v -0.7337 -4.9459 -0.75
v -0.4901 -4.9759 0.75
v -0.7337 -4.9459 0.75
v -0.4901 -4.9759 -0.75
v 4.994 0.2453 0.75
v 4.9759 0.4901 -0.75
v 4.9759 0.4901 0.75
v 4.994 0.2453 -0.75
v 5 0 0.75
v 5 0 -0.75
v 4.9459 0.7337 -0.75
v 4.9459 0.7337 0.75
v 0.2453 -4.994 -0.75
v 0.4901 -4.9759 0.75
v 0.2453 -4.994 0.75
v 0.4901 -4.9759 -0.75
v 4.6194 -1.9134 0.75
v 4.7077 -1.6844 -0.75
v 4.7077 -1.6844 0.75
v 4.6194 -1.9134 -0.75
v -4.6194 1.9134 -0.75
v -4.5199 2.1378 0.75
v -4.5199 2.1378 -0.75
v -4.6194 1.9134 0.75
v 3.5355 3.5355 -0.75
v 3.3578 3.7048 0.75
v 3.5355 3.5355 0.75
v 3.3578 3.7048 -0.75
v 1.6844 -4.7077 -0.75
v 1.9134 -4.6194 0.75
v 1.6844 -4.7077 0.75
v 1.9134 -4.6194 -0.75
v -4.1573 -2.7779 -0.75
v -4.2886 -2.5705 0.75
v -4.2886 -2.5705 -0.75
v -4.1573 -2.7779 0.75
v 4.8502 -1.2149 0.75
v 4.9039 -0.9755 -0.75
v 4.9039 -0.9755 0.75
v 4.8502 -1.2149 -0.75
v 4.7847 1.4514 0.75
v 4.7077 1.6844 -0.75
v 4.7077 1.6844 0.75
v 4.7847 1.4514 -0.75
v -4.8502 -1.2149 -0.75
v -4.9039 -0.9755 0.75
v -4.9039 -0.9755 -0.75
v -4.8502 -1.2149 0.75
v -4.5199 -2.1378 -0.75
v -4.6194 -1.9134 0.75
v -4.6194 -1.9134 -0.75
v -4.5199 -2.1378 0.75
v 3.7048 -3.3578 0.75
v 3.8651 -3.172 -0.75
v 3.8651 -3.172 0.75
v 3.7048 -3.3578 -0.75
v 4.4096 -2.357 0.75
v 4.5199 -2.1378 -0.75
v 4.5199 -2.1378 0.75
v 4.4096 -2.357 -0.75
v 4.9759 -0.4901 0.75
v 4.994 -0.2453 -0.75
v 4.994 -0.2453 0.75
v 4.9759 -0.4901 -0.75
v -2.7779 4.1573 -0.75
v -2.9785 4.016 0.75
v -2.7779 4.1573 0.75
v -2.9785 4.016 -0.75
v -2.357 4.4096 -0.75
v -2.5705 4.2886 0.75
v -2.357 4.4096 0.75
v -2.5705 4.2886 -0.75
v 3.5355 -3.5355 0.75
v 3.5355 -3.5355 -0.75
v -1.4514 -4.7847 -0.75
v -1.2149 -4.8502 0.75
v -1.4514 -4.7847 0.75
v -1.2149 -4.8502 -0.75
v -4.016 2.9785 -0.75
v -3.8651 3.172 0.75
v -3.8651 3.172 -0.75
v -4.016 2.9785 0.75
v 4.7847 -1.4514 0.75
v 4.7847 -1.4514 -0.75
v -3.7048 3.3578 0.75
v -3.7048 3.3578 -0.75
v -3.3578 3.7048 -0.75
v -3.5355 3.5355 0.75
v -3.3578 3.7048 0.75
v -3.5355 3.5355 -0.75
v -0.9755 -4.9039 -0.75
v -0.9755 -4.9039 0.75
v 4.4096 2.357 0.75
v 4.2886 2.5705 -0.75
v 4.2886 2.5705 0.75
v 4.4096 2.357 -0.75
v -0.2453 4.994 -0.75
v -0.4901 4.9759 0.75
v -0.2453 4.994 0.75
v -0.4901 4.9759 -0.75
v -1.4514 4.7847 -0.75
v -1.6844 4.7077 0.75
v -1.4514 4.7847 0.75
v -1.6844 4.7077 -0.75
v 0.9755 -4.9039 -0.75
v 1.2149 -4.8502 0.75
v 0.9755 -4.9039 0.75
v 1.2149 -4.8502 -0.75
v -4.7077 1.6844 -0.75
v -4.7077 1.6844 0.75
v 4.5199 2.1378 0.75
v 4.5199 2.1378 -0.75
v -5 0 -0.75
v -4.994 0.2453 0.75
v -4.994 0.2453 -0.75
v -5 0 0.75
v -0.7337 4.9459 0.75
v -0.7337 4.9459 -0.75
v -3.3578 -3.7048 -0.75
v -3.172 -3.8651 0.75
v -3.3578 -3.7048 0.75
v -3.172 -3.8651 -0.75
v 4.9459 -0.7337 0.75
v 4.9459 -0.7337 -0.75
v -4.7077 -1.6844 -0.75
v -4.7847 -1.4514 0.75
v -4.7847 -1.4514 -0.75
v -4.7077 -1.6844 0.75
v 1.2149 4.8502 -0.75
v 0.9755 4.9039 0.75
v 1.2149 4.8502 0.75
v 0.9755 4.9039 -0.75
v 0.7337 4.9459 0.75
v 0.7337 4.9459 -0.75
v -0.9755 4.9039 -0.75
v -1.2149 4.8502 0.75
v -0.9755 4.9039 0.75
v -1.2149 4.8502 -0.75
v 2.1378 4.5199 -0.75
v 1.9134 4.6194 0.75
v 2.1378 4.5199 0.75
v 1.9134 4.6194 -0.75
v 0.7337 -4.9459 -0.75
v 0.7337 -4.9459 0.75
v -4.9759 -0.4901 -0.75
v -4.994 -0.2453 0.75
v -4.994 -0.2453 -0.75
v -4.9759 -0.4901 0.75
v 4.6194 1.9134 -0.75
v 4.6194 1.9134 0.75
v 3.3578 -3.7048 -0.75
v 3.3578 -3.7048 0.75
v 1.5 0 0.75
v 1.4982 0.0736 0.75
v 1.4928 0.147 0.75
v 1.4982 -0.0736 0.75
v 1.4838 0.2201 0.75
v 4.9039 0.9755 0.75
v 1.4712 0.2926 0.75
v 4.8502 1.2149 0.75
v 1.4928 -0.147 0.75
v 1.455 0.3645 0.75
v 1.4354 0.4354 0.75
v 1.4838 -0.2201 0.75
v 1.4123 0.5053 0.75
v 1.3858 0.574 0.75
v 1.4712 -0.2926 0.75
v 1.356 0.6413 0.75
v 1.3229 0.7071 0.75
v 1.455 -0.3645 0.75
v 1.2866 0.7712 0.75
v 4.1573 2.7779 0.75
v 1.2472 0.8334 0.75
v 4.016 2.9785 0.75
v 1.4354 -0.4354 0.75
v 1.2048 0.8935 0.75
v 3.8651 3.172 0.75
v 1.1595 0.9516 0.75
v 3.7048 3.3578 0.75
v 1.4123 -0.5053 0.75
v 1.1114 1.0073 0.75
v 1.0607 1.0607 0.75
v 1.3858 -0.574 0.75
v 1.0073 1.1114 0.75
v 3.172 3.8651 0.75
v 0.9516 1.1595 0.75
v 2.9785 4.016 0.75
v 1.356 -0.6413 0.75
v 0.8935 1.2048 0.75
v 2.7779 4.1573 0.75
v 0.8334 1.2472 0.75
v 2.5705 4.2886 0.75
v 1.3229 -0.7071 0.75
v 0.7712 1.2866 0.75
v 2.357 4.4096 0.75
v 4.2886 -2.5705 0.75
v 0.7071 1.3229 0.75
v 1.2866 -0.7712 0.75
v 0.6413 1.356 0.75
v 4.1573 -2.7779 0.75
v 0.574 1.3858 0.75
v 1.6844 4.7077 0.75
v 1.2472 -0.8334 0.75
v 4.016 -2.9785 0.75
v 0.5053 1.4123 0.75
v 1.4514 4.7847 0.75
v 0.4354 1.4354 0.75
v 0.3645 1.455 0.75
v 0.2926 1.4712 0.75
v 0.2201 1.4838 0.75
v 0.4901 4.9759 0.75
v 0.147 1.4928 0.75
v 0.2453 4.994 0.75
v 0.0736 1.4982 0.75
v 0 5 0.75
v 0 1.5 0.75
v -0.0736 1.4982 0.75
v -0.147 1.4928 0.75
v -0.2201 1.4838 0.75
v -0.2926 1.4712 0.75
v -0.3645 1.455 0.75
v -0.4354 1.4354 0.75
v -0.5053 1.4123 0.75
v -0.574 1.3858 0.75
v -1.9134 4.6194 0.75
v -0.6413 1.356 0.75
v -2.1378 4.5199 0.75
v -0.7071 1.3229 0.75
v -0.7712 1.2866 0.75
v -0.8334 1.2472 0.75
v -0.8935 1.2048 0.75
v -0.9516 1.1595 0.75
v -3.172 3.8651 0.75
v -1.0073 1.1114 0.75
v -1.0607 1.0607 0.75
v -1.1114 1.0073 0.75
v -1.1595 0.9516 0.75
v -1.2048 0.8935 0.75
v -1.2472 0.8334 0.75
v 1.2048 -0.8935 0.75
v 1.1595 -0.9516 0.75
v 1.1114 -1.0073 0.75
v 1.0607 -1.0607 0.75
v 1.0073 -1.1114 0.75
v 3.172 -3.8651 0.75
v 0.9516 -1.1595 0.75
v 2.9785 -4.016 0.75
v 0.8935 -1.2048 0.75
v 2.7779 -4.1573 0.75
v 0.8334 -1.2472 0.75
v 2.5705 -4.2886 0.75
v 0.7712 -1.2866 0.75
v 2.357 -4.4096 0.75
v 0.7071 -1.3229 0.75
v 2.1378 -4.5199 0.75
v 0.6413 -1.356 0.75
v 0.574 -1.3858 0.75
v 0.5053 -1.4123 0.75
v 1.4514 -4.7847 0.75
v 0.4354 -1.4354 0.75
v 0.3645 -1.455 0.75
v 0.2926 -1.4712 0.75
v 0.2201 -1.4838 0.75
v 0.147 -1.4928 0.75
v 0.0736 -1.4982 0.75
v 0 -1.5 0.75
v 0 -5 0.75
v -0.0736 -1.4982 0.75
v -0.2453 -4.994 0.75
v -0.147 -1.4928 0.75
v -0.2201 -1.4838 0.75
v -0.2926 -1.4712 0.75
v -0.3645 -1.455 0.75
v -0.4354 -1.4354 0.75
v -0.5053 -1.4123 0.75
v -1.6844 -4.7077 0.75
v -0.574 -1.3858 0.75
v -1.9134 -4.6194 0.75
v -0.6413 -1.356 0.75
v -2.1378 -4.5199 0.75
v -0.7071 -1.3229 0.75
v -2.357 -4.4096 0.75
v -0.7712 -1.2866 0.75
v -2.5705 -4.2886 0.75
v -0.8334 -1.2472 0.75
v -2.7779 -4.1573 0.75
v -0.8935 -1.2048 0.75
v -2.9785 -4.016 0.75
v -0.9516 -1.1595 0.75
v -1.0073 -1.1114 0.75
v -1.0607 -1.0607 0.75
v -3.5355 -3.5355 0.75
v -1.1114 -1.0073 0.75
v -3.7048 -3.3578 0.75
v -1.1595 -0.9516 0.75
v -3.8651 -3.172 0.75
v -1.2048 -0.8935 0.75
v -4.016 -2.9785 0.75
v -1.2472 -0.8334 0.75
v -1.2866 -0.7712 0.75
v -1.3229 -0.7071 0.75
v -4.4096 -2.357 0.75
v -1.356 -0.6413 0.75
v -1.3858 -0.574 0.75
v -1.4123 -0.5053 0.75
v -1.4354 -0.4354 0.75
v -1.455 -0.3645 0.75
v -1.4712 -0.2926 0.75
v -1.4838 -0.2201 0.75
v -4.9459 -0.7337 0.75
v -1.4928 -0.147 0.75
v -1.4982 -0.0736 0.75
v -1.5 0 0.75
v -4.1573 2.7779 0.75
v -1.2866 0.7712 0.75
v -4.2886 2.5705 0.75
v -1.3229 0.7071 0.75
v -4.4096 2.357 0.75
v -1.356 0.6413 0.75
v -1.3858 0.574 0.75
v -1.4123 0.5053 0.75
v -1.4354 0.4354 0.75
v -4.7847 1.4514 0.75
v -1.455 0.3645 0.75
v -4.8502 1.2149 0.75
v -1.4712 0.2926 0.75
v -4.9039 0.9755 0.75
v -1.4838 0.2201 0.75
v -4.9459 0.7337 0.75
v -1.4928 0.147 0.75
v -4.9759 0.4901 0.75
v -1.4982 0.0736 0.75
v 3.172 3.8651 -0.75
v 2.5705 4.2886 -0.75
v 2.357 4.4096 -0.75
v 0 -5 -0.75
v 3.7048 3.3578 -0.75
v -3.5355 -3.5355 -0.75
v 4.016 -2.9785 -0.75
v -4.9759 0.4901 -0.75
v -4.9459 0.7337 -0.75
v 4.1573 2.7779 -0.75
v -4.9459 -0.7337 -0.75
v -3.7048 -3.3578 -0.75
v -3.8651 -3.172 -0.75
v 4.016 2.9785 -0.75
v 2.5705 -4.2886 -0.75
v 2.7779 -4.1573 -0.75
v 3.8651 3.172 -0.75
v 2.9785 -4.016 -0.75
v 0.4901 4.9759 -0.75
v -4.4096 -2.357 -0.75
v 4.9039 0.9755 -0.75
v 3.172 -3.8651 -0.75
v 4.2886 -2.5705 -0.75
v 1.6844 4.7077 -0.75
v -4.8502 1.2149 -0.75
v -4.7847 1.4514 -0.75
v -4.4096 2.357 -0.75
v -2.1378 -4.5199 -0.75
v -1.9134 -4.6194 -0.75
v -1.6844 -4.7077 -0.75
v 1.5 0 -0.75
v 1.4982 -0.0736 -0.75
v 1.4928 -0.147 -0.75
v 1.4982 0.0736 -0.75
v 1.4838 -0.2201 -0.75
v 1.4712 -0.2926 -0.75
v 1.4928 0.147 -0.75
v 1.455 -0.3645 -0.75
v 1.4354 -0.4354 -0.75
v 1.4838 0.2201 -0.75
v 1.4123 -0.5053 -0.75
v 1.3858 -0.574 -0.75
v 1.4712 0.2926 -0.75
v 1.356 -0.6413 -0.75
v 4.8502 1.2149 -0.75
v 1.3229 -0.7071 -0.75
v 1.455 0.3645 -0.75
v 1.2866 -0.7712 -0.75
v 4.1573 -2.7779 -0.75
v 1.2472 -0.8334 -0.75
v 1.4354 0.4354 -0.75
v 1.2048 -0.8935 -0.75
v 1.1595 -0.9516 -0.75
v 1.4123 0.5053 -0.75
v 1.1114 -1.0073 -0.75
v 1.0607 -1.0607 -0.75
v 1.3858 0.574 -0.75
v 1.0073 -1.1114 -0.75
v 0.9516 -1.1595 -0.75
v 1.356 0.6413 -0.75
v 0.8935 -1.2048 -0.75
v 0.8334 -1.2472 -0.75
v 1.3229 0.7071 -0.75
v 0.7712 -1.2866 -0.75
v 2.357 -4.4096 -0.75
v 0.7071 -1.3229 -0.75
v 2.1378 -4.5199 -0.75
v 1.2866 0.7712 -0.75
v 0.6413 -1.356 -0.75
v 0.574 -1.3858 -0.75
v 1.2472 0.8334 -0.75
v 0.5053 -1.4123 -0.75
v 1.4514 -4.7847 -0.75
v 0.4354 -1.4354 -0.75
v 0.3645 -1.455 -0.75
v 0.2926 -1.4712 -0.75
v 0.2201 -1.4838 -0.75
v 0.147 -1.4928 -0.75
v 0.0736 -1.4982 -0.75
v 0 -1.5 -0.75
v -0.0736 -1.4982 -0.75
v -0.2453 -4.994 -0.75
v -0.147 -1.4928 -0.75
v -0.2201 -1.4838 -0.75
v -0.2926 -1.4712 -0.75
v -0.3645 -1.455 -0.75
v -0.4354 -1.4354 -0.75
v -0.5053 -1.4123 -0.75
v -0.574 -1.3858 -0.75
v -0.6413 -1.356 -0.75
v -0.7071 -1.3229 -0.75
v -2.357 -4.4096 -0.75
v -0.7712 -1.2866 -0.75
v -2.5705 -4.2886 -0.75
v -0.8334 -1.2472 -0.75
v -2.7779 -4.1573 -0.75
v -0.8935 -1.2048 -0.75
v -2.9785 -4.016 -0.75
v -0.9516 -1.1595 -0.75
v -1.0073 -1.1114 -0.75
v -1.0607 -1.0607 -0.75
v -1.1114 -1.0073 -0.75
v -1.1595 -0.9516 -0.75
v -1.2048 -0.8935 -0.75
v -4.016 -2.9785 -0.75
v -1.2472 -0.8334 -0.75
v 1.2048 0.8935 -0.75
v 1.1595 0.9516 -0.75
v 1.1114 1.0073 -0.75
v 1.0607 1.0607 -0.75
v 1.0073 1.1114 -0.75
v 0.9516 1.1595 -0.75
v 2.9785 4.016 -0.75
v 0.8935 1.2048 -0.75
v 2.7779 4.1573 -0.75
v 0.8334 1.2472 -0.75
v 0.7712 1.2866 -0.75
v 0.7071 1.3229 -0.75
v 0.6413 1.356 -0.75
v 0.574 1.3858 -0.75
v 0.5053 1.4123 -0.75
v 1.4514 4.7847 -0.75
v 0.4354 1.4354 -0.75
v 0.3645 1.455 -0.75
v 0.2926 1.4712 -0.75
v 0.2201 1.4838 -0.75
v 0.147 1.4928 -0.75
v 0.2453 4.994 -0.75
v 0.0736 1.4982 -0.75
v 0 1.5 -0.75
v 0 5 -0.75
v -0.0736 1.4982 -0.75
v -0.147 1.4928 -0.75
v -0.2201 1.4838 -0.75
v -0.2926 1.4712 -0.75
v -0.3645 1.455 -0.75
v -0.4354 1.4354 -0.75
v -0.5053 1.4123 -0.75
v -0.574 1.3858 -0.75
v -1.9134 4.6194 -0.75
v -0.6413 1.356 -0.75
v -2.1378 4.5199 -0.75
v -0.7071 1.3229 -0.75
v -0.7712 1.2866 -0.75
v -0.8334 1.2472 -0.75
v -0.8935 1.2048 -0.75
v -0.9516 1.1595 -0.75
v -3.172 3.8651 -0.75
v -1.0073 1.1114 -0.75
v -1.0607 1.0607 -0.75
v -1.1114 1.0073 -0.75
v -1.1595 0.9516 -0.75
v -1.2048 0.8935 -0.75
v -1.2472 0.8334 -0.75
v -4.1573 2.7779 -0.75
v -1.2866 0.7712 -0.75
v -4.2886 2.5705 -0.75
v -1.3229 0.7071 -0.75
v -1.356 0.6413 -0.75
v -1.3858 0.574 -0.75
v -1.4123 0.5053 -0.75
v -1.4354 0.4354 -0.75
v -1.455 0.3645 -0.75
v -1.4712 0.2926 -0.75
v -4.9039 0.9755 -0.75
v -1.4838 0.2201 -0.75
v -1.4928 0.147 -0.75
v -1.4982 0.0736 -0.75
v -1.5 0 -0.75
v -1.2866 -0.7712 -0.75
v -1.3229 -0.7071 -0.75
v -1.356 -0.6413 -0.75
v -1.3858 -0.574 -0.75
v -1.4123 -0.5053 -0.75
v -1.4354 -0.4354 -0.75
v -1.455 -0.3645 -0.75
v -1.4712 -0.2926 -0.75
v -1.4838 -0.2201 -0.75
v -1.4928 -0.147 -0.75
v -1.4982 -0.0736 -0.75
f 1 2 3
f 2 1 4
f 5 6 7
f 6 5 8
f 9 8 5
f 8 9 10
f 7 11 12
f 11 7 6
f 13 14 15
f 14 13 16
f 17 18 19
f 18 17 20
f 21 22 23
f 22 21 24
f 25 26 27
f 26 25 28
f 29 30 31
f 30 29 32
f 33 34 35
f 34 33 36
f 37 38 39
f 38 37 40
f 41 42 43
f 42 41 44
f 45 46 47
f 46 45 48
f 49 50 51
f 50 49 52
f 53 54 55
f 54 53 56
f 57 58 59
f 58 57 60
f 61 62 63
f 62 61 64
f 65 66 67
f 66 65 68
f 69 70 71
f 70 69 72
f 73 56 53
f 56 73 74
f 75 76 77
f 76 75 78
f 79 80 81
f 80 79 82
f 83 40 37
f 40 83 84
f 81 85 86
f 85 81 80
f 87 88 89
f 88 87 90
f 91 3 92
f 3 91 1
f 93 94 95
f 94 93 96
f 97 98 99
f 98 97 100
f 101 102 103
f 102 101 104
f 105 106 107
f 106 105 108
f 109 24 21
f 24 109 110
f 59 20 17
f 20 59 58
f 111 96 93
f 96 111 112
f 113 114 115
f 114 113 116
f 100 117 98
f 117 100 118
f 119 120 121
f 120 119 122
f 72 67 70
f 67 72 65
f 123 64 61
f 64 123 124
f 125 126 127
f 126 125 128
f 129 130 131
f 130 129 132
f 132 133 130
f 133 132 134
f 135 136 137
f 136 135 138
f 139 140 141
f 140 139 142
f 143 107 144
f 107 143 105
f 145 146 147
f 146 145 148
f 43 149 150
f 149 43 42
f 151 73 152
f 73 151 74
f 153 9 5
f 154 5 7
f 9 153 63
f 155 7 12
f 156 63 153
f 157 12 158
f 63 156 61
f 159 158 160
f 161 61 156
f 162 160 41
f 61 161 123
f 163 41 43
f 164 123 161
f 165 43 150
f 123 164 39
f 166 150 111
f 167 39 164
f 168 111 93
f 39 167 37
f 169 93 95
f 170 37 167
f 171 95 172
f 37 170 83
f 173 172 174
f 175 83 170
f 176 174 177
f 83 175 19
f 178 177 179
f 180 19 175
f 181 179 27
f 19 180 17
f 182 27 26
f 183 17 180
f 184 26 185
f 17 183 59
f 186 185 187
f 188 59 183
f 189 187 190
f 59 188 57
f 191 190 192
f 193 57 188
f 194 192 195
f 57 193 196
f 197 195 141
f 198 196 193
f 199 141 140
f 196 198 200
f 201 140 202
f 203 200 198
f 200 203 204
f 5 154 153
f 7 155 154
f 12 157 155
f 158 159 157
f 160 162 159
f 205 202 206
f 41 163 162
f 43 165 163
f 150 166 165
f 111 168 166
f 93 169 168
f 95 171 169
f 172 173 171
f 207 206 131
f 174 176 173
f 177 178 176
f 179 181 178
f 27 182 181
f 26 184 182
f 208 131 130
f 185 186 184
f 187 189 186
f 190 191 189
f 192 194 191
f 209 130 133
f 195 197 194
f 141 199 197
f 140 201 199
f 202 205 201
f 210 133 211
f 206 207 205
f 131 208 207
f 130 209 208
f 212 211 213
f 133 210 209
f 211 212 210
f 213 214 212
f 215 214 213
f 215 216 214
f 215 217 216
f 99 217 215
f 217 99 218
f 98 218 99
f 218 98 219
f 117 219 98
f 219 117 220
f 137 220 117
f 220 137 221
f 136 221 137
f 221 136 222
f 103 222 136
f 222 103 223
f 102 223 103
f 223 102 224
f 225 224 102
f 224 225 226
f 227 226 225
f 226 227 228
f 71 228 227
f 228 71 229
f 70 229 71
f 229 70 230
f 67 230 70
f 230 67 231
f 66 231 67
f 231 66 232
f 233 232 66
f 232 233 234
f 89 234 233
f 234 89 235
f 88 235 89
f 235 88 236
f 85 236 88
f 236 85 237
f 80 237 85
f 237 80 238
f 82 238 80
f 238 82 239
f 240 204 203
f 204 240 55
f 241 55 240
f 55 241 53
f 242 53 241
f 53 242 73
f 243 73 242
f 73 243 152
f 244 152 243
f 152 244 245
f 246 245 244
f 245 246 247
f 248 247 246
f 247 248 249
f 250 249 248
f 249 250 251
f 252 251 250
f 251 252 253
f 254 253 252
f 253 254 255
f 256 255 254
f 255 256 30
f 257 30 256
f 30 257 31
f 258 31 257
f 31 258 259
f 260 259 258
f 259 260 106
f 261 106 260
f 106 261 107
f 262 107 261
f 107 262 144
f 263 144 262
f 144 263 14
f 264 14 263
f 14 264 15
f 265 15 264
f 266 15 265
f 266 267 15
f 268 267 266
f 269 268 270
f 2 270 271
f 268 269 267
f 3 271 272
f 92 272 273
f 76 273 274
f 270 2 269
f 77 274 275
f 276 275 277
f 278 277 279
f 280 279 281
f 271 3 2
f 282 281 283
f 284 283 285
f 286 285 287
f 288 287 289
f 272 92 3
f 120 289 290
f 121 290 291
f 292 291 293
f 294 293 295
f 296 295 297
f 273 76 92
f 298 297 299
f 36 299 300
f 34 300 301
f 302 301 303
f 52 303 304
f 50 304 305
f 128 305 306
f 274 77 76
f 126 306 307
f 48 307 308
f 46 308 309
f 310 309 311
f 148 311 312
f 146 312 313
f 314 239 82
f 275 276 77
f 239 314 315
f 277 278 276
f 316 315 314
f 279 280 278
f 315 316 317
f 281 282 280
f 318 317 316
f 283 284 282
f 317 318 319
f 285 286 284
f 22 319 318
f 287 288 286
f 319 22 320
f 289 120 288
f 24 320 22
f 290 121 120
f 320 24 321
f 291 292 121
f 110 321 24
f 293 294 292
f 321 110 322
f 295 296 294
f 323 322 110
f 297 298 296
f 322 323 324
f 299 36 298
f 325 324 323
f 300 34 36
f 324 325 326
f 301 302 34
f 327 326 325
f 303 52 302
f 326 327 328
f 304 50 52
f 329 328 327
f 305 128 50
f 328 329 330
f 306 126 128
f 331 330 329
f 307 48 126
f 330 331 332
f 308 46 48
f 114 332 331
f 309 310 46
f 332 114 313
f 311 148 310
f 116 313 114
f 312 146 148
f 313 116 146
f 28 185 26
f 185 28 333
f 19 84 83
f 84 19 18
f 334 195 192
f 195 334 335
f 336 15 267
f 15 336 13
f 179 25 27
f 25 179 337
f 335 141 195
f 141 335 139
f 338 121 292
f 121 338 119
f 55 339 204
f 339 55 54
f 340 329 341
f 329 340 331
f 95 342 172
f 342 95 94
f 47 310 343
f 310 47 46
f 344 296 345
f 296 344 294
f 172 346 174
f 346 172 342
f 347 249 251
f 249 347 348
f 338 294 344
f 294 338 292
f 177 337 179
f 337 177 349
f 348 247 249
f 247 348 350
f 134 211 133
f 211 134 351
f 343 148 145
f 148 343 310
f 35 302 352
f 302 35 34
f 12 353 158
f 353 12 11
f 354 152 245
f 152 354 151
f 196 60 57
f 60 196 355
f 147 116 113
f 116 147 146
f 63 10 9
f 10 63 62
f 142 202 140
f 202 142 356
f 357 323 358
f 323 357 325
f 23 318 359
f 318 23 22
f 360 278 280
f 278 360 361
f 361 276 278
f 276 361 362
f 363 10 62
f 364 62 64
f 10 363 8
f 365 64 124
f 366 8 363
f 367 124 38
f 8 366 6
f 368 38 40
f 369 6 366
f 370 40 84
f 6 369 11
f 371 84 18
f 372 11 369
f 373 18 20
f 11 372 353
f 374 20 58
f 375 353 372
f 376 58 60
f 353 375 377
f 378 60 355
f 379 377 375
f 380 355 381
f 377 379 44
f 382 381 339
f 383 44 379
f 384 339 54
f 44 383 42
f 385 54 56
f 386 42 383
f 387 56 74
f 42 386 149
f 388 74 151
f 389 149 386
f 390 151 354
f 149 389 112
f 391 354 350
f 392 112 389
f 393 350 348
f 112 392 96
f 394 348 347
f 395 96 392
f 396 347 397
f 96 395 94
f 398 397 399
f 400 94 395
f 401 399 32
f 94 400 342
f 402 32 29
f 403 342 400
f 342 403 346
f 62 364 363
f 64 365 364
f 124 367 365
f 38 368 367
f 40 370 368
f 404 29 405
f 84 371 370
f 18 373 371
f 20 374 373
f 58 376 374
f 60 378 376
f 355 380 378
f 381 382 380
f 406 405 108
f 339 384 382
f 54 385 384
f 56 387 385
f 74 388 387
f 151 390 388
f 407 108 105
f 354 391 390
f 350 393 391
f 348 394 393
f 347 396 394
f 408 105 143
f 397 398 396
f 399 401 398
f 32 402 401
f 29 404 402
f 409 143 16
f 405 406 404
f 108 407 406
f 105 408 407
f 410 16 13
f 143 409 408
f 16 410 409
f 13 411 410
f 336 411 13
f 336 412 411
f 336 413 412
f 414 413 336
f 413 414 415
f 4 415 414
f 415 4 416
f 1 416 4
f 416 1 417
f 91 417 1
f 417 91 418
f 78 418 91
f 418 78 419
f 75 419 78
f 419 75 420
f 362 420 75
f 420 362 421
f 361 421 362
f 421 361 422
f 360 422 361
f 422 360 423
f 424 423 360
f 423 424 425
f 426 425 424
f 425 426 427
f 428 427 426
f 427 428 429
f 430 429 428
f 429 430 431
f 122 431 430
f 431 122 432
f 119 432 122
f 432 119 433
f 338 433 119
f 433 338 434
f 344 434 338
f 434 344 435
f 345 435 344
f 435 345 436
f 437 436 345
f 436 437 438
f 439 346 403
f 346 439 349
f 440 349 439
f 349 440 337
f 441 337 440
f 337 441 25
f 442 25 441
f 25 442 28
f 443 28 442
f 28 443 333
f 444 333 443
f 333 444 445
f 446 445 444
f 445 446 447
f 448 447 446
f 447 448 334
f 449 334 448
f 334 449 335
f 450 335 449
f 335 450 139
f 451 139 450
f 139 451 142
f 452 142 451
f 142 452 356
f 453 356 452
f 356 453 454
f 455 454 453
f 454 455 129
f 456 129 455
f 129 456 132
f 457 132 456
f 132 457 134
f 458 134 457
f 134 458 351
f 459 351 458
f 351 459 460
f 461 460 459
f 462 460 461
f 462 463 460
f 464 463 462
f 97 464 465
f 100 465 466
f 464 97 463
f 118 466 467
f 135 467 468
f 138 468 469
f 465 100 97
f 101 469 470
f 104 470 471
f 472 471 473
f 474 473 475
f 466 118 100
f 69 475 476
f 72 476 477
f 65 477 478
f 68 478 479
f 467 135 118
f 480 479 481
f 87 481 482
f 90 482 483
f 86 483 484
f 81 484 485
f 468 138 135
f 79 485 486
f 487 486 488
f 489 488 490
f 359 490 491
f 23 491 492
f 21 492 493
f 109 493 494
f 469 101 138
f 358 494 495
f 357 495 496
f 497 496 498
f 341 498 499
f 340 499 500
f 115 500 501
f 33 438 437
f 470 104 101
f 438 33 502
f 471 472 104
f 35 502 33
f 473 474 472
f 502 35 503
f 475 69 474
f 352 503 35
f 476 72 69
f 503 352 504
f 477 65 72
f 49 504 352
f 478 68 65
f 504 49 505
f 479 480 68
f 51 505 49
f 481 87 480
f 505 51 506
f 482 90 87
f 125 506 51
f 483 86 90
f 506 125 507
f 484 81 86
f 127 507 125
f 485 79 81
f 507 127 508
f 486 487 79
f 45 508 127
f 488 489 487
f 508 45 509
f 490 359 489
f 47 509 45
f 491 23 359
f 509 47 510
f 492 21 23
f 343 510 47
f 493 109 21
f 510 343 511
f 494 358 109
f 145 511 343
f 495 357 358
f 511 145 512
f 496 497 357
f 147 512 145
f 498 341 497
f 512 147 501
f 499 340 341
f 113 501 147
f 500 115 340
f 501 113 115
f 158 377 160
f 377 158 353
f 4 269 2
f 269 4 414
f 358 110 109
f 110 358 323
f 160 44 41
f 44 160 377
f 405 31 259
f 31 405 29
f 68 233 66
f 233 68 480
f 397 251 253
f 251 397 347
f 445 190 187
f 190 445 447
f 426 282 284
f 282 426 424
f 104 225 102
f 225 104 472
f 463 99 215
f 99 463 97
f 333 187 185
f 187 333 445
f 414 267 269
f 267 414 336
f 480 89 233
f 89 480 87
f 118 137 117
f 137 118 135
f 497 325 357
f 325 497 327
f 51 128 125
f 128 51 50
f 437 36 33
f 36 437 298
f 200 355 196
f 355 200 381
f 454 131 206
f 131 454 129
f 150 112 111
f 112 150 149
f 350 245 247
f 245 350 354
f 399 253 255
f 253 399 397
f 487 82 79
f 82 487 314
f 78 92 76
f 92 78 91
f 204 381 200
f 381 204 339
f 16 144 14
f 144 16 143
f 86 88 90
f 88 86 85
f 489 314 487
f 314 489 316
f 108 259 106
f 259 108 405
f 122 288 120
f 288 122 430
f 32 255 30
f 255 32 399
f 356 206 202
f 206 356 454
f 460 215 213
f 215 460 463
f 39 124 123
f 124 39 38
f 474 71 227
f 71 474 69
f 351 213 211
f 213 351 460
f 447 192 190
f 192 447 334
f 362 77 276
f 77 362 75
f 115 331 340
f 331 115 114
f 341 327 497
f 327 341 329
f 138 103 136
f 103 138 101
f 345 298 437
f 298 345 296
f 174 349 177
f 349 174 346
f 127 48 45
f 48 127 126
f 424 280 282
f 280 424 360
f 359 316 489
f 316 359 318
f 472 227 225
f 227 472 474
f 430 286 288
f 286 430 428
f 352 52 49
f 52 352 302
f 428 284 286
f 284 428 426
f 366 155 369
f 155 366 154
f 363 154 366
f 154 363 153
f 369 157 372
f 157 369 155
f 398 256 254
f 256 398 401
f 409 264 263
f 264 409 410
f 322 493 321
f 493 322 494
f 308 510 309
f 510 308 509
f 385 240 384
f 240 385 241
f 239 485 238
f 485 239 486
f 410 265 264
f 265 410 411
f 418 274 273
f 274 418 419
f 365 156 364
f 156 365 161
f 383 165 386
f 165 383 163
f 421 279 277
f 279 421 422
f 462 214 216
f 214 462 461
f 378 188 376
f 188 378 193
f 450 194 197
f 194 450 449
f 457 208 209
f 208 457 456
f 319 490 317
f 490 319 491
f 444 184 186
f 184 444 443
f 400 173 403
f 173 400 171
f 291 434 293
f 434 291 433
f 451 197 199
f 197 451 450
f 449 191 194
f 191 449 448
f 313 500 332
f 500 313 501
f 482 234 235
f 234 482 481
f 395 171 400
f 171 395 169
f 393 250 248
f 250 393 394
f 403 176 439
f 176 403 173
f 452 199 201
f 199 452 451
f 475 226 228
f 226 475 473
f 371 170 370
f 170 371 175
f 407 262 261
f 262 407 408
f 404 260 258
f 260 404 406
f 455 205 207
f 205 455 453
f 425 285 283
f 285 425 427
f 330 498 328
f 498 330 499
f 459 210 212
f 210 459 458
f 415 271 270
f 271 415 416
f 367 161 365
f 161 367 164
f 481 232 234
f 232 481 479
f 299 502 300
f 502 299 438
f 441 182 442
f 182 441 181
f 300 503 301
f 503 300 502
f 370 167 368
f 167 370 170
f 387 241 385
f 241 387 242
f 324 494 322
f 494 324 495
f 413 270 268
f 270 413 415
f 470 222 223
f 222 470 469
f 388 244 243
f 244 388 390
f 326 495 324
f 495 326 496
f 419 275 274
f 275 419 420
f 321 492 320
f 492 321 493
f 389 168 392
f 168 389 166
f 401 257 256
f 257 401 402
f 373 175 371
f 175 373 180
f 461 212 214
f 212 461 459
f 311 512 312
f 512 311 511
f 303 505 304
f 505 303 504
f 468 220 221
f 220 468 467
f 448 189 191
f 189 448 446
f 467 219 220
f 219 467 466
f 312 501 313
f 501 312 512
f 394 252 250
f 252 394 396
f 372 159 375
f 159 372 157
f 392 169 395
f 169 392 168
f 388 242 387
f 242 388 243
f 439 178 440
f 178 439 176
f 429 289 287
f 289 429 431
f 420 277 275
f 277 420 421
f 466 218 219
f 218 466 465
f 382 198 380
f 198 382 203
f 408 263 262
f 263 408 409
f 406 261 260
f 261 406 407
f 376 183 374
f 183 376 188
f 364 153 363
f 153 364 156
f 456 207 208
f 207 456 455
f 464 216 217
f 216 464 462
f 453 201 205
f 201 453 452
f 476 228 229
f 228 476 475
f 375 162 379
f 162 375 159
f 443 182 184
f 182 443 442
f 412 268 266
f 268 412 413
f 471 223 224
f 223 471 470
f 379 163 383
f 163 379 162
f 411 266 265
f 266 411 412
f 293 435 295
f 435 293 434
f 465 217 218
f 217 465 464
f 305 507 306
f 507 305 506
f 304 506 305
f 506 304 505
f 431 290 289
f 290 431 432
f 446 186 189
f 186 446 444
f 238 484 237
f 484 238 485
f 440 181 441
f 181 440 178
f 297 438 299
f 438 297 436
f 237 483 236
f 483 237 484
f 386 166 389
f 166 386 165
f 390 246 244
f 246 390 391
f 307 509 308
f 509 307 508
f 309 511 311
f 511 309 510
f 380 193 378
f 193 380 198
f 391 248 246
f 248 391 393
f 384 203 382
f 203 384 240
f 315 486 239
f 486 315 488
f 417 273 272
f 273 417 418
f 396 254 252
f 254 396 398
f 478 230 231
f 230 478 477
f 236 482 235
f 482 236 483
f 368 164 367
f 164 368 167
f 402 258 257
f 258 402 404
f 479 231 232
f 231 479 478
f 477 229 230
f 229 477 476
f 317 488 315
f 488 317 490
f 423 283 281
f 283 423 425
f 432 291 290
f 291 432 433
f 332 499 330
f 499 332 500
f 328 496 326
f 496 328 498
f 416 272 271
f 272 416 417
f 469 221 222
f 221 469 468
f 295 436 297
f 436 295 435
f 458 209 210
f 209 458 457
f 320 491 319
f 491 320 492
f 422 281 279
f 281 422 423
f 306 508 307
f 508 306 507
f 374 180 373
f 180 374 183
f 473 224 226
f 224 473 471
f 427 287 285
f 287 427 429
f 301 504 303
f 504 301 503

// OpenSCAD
// Rubber washer: 3.0mm inner hole, 10.0mm outer diameter, 1.5mm thickness

inner_diameter_mm = 3.0;   //[1.5:6.0:0.1]
outer_diameter_mm = 10.0;  //[5.0:20.0:0.1]
thickness_mm      = 1.5;   //[0.75:3.0:0.05]

eps_mm = 0.02;             // small overlap for clean boolean
$fn = 128;                 // smooth circular hole and OD

module rubber_washer() {
    color([0.2, 0.2, 0.2])  // rubber-like dark gray
    difference() {
        cylinder(d=outer_diameter_mm, h=thickness_mm, center=true);
        cylinder(d=inner_diameter_mm, h=thickness_mm + 2*eps_mm, center=true);
    }
}

rubber_washer();
